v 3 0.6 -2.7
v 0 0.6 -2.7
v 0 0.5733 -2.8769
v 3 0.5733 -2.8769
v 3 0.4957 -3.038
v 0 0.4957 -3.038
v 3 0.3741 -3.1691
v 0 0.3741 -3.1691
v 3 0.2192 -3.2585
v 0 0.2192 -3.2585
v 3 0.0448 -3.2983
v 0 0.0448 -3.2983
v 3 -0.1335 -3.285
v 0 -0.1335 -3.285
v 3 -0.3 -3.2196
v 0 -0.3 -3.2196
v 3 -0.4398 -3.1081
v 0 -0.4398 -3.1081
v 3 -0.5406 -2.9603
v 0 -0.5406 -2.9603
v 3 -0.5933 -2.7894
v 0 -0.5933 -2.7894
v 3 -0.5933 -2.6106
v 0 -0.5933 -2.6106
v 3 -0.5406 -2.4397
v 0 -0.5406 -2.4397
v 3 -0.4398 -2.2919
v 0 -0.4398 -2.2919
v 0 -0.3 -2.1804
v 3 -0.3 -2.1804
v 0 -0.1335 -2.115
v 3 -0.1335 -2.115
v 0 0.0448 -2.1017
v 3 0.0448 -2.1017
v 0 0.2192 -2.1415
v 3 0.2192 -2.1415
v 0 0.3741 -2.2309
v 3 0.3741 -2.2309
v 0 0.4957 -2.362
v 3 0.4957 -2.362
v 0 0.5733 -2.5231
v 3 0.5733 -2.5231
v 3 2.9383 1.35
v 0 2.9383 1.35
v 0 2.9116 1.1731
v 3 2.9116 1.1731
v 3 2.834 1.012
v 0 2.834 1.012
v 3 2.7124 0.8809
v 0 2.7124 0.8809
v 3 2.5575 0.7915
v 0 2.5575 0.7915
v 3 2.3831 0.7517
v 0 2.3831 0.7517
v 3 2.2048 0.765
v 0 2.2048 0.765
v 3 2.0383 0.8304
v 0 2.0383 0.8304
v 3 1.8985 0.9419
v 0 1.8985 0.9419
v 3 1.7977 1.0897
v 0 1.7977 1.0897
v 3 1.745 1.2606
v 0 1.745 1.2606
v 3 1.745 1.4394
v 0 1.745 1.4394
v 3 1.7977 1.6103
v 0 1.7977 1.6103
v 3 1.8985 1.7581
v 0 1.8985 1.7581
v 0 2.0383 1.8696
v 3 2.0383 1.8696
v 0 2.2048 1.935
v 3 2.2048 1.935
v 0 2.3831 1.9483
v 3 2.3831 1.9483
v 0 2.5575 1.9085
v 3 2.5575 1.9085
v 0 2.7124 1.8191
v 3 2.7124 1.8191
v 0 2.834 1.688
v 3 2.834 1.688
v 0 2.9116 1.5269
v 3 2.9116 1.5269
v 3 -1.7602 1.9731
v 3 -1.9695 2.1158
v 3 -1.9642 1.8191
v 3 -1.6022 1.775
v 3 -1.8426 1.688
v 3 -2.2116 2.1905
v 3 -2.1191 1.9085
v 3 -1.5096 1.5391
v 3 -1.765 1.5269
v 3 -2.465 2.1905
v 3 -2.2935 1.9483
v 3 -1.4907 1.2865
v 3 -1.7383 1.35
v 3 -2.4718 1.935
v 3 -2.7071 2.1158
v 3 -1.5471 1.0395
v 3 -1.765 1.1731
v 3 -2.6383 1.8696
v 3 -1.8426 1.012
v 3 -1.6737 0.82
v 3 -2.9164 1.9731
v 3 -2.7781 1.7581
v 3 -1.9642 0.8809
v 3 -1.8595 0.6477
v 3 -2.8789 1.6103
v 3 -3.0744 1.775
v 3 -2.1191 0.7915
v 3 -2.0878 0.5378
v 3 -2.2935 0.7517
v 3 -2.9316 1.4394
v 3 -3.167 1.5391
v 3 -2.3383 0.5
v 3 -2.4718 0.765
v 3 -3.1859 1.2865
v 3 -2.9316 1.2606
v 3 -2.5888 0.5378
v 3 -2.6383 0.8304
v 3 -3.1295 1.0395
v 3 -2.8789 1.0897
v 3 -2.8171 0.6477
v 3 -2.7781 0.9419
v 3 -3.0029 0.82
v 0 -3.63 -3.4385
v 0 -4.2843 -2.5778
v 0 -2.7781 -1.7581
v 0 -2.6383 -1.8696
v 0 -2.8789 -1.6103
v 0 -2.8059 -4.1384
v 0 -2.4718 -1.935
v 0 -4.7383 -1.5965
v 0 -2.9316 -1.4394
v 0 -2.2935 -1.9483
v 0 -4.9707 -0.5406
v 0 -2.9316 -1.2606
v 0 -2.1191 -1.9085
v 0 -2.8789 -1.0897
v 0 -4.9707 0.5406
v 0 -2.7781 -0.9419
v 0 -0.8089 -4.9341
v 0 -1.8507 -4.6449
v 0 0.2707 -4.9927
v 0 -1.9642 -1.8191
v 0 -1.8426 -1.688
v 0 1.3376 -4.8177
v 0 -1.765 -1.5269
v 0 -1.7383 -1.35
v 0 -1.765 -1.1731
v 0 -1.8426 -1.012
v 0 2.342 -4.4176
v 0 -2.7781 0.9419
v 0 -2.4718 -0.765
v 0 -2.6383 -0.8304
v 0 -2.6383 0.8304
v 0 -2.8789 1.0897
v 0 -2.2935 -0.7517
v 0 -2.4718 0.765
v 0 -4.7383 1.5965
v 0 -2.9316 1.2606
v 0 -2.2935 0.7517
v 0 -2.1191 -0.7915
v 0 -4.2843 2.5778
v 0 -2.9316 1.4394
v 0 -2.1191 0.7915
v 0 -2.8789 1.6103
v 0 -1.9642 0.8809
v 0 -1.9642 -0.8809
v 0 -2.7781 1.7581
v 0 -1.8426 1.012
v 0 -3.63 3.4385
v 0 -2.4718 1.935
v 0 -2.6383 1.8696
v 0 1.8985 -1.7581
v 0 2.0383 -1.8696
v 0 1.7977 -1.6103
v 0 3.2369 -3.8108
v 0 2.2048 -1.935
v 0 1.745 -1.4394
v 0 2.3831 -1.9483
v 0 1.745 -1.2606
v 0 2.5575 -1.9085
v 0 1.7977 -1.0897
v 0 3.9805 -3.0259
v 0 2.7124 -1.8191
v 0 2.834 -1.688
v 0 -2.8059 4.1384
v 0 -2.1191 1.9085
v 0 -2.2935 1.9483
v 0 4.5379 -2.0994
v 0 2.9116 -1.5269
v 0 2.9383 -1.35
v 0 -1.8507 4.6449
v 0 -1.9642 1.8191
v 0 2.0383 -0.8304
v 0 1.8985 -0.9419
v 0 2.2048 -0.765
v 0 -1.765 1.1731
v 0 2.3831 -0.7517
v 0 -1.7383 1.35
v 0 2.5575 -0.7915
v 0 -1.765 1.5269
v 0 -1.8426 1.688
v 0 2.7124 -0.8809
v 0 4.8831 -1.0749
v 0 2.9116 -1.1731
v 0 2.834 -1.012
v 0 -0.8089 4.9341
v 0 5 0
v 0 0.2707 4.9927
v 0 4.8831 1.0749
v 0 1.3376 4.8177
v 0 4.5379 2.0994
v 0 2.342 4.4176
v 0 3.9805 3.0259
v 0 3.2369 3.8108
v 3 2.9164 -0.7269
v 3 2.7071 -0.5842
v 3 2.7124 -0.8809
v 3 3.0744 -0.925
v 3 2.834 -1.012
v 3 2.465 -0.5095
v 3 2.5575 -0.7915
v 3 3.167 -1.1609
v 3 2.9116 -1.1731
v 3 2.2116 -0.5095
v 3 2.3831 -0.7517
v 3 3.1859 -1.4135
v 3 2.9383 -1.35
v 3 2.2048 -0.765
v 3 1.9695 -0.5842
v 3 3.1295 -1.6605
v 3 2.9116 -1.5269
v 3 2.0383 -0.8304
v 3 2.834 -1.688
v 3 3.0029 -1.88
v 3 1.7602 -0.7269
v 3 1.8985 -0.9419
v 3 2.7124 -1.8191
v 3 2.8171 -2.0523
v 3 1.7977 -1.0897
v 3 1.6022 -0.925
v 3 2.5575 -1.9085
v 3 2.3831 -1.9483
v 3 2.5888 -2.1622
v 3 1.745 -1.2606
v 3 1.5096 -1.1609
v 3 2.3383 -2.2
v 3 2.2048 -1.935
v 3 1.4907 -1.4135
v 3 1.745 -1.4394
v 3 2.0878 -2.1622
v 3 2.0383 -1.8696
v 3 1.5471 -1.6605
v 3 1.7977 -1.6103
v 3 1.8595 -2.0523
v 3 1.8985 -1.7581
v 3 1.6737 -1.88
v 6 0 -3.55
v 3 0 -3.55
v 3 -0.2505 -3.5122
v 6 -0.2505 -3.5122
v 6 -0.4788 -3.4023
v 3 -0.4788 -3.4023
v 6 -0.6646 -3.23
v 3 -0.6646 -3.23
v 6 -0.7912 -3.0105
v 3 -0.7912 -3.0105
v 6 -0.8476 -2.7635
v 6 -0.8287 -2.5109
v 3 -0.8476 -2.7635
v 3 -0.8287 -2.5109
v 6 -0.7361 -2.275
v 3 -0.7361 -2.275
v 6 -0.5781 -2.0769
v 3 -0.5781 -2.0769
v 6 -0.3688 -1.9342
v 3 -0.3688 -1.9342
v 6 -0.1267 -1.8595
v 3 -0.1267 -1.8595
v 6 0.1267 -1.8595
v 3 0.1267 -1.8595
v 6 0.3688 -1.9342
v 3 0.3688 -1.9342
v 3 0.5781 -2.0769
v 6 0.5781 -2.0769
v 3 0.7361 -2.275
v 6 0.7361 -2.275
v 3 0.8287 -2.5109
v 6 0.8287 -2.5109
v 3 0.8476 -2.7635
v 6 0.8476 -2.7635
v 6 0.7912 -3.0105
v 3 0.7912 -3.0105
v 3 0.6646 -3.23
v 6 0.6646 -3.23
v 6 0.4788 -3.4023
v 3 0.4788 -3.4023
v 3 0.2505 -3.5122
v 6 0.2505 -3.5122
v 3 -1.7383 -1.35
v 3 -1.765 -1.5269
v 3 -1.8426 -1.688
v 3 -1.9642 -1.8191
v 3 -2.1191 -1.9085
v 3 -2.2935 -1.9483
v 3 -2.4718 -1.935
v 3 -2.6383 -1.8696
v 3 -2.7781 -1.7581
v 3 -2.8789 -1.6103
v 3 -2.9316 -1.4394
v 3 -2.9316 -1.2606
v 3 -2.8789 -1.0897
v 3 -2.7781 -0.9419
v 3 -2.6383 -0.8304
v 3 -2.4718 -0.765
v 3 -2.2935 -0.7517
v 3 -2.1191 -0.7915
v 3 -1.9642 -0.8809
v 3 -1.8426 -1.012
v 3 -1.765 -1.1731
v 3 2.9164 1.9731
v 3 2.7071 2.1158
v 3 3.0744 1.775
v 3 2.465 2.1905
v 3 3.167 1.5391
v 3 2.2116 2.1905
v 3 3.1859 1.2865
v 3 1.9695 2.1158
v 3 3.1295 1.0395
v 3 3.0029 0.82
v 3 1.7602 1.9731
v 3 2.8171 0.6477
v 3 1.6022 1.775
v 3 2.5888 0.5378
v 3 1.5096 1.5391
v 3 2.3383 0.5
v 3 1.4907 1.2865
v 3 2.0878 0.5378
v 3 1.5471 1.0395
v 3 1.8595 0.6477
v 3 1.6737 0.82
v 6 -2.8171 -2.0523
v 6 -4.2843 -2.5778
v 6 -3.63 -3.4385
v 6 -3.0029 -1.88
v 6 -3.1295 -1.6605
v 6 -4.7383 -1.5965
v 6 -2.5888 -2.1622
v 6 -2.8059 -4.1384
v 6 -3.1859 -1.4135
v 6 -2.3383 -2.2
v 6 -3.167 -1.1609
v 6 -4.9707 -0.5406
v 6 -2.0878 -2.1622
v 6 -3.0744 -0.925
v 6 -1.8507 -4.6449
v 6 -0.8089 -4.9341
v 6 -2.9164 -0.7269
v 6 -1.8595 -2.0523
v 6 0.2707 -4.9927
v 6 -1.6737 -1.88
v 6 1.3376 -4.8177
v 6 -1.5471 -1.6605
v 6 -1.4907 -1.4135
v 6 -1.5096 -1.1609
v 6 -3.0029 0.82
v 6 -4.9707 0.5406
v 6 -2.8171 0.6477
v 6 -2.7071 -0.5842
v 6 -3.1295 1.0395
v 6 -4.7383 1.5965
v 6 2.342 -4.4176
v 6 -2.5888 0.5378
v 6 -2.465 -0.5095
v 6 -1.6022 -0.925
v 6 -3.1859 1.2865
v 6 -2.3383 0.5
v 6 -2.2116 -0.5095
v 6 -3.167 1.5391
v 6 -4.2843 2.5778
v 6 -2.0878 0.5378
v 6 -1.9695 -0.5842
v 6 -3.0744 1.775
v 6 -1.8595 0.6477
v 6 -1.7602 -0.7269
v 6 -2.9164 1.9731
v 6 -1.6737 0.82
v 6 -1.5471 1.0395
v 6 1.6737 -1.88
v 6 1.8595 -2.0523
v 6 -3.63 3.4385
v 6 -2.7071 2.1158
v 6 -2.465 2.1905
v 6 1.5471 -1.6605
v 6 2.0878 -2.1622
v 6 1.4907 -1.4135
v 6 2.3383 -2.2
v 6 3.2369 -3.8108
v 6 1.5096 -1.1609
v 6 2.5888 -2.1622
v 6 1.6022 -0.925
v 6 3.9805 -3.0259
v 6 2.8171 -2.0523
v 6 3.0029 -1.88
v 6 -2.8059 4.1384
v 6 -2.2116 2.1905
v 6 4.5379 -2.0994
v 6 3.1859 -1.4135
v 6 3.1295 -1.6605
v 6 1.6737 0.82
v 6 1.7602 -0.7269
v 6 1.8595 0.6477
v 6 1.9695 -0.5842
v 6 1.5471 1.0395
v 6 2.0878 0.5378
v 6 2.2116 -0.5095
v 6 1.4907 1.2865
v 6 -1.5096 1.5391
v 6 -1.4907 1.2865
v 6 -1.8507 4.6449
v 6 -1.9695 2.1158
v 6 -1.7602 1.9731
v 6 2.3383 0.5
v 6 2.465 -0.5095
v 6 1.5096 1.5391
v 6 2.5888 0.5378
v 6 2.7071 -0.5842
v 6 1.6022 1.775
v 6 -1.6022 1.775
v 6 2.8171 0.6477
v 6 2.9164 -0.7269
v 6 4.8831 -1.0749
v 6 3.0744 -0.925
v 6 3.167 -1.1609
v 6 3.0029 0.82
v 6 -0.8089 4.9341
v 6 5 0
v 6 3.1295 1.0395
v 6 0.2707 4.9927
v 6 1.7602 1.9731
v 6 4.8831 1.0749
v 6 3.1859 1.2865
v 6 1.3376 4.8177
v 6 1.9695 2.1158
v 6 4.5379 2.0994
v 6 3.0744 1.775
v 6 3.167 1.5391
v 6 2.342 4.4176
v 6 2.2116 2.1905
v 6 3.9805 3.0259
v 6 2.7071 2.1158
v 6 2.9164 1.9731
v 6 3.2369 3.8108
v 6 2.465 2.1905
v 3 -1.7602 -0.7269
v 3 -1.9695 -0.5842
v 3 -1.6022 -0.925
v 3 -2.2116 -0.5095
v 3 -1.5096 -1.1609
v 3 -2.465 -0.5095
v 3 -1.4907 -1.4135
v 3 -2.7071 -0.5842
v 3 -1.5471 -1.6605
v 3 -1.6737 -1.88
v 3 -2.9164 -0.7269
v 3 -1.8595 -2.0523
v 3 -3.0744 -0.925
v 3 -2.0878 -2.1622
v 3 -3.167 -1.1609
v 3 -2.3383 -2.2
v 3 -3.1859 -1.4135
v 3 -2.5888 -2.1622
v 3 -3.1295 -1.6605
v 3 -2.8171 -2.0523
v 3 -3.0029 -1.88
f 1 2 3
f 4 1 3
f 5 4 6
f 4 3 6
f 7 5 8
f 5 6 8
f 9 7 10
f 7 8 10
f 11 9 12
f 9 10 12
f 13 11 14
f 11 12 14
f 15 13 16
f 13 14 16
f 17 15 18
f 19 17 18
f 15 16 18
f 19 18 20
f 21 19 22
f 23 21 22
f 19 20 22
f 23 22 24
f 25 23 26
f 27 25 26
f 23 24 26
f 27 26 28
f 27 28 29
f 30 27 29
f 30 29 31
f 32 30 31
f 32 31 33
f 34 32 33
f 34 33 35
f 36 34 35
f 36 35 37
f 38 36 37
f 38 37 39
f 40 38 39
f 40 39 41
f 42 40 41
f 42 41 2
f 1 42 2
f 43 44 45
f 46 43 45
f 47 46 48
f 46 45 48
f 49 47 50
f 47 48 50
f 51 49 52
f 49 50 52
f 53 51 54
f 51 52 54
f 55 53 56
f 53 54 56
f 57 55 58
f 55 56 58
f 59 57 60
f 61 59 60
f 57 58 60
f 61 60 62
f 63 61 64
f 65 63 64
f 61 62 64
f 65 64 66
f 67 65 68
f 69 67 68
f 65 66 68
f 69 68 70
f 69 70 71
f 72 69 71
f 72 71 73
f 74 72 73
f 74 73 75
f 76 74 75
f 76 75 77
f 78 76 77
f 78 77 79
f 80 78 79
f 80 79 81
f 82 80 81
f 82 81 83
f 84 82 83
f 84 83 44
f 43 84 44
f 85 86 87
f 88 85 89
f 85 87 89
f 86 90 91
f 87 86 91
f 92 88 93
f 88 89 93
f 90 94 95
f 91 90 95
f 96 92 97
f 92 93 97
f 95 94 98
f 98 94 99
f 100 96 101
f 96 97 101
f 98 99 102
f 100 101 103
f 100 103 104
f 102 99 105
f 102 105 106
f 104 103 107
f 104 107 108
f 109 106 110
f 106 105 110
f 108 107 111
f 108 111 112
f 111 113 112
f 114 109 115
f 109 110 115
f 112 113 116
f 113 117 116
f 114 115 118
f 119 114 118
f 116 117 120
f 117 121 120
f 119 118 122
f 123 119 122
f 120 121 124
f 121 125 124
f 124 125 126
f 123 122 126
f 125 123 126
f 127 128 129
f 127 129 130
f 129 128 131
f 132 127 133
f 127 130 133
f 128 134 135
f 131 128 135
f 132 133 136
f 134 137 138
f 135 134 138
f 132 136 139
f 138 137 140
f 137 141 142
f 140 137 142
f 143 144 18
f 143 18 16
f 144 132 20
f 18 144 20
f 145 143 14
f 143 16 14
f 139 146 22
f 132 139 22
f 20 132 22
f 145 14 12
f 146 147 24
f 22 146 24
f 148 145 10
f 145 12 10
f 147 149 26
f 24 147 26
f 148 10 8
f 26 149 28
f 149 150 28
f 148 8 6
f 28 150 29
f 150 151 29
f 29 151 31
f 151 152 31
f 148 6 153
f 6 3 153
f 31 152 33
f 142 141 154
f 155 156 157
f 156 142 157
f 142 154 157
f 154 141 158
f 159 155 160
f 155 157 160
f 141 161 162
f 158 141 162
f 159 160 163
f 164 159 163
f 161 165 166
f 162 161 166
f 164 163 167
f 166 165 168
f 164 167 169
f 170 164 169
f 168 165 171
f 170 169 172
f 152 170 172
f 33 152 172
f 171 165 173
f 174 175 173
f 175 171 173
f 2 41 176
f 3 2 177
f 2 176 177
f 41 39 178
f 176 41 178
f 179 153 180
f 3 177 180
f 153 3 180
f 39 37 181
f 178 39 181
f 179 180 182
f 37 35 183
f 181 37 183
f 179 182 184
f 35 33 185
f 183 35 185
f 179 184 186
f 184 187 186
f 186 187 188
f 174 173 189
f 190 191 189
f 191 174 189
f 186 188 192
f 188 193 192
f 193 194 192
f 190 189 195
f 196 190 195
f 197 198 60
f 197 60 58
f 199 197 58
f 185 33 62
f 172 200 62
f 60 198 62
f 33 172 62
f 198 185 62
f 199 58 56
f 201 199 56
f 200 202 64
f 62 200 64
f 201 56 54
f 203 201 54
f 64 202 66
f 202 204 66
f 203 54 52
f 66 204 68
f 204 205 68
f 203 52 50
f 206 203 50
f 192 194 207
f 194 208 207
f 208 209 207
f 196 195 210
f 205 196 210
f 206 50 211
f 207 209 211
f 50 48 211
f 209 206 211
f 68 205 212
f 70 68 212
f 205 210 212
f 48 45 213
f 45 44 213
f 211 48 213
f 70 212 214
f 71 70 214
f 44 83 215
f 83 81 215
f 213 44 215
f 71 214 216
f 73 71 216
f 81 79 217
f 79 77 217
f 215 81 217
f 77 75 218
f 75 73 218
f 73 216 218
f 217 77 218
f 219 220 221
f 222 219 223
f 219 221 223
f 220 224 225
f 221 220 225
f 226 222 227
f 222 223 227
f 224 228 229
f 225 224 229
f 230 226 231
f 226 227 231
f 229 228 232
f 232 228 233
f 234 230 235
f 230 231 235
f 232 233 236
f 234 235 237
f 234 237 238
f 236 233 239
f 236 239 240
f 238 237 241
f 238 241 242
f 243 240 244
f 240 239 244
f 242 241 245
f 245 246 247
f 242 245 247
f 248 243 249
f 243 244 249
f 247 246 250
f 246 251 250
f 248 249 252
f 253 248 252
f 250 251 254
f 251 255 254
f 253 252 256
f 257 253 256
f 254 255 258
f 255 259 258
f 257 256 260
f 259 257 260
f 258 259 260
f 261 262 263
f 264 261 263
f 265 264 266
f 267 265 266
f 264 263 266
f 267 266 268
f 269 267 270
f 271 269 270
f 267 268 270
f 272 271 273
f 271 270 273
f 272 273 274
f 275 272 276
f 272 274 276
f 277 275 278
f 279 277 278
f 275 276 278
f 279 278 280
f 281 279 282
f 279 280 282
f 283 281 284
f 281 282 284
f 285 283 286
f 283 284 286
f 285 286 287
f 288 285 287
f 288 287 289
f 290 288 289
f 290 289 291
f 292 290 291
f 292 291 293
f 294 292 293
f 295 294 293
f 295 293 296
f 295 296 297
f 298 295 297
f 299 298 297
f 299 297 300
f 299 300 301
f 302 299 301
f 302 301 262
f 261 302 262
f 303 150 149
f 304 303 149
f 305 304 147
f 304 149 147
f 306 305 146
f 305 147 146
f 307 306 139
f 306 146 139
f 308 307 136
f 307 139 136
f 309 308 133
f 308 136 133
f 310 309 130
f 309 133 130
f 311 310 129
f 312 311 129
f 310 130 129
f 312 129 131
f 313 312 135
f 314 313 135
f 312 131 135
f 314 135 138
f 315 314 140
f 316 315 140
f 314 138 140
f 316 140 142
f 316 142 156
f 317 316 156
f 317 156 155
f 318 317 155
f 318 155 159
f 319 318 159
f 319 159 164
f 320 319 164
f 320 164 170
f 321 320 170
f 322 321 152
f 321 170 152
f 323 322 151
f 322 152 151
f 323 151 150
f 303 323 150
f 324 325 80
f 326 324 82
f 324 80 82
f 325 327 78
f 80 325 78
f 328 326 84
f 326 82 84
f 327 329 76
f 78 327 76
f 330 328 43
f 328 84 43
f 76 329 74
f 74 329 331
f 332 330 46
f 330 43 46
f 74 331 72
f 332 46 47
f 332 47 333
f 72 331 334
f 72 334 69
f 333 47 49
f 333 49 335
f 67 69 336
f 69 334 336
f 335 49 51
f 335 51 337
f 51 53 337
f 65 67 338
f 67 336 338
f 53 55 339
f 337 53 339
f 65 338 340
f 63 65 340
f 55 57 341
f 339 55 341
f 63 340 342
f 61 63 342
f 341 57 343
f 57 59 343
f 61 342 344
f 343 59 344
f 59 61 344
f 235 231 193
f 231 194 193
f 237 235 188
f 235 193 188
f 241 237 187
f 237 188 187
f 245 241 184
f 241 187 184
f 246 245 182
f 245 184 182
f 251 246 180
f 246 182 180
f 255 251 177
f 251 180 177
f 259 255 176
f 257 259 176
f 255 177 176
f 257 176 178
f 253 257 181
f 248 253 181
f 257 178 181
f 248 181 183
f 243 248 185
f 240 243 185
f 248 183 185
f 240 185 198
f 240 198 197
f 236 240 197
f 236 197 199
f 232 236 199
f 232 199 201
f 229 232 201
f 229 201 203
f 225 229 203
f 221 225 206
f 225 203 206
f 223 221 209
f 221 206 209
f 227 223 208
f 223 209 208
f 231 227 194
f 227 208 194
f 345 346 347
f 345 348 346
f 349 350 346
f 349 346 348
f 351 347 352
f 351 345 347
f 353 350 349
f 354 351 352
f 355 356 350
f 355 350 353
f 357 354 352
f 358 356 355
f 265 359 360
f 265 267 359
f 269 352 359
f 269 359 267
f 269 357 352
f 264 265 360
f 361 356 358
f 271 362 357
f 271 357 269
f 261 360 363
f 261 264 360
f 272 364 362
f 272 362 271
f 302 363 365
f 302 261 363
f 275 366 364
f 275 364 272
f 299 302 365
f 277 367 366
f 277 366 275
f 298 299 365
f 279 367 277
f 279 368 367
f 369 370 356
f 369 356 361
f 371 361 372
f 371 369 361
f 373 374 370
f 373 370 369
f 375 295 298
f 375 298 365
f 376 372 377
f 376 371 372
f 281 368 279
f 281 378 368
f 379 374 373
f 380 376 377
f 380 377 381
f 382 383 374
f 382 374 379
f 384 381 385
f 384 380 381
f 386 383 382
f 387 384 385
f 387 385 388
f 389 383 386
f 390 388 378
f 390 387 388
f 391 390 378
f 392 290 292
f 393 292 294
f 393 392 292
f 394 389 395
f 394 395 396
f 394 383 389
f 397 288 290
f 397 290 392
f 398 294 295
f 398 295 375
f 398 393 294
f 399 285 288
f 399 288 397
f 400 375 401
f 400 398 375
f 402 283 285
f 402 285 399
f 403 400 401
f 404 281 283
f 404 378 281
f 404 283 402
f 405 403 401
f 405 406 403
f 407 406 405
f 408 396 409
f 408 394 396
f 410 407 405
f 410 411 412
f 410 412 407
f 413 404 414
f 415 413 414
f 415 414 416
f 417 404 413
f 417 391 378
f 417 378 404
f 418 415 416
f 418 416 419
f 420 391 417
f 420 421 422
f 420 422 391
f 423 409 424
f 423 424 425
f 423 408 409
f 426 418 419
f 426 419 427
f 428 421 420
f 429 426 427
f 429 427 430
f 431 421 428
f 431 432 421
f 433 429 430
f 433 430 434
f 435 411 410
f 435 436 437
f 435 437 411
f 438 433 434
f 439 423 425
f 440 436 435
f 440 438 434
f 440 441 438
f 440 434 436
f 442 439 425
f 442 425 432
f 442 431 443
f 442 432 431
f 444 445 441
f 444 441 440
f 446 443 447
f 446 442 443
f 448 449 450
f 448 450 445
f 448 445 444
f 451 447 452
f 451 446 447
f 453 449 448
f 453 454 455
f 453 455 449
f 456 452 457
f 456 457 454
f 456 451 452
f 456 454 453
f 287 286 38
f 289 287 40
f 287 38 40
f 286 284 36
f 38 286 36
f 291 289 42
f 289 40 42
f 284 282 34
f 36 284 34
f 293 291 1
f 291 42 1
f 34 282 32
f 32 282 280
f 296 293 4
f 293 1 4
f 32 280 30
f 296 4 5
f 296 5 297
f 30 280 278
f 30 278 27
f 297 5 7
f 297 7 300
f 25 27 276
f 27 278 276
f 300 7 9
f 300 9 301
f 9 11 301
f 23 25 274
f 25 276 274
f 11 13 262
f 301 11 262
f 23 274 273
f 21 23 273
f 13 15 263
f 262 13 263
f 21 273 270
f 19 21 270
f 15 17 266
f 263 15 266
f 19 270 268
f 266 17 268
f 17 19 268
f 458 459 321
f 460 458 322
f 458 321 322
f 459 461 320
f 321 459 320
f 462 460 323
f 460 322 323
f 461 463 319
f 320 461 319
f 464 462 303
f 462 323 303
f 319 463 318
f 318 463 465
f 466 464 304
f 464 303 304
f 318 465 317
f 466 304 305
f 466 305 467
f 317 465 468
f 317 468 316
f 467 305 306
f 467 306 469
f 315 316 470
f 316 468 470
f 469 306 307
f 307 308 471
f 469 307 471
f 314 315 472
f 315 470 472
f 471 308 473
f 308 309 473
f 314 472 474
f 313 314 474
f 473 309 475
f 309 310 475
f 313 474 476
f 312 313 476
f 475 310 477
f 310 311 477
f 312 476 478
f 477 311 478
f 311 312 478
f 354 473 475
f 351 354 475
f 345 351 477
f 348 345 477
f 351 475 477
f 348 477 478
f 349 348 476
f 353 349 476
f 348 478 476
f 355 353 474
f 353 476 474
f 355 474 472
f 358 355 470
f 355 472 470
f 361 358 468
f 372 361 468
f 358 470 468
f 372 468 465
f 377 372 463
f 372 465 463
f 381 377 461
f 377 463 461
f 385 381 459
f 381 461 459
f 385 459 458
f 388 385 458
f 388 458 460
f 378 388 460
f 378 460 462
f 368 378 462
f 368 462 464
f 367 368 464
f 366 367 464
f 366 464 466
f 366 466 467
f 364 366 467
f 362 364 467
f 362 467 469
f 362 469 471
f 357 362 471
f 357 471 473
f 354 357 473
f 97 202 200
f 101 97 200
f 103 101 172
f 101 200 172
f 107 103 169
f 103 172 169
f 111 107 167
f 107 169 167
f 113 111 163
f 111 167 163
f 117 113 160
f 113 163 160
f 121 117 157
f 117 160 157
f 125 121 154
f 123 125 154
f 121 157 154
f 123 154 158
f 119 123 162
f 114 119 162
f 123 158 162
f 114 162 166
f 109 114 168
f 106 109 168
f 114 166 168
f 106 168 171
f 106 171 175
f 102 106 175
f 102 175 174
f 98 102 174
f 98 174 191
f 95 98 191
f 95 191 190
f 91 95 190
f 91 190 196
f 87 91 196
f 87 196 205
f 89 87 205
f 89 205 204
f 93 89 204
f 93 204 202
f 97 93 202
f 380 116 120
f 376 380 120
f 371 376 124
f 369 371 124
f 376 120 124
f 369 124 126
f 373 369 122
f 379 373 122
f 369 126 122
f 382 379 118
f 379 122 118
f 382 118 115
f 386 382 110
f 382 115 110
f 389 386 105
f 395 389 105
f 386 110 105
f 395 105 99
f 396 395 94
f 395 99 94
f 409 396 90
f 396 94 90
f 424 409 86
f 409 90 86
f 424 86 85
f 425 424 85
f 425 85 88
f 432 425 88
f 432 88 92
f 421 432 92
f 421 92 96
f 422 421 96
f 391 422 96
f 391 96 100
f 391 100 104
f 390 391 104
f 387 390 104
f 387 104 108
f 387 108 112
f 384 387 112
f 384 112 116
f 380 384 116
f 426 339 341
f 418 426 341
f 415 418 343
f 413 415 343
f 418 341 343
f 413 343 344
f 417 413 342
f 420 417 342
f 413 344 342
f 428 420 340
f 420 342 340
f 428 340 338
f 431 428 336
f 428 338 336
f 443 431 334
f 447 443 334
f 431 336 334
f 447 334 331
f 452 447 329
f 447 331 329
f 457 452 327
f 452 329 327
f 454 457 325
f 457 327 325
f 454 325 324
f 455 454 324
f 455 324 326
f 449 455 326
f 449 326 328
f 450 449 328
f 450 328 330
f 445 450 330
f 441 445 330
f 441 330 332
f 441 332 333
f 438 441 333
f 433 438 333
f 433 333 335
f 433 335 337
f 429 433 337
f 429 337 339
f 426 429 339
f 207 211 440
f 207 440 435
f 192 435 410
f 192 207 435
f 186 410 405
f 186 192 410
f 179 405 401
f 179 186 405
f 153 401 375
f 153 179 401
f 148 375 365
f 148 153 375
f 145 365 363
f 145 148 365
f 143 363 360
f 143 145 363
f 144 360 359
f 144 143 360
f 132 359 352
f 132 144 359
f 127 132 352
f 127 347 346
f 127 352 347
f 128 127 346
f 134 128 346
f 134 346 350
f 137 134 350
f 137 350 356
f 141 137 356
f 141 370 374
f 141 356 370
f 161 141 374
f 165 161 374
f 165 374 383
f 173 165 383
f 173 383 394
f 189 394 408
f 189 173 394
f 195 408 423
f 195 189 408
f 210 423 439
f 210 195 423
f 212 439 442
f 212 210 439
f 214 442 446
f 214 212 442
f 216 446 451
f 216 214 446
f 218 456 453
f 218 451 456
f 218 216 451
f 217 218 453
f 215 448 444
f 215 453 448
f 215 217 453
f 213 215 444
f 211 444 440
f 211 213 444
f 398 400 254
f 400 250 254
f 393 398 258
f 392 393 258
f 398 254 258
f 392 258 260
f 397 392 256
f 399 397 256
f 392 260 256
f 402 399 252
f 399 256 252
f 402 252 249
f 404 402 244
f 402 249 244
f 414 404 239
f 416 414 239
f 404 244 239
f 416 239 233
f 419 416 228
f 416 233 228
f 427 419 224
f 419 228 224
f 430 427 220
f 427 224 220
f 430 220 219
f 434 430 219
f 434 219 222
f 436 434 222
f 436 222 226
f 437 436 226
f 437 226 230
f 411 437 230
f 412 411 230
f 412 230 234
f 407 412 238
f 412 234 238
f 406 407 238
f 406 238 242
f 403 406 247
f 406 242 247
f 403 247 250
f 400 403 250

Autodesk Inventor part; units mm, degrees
ref_plane "YZ Plane" through (0, 0, 0) normal (1, 0, 0) x (0, 1, 0)
ref_plane "XZ Plane" through (0, 0, 0) normal (0, 1, 0) x (-1, 0, 0)
ref_plane "XY Plane" through (0, 0, 0) normal (0, 0, 1) x (1, 0, 0)
sketch "Эскиз1" plane through (0, 0, 0) normal (1, 0, 0) x (0, 1, 0)
  circle A0 centre (0, 0) radius 5
  circle A1 centre (0, -2.7) radius 0.6
  circle A2 centre (0, 0) radius 2.7 construction
  circle A3 centre (-2.3383, 1.35) radius 0.6
  circle A4 centre (2.3383, 1.35) radius 0.6
  line L0 (0, 0) -> (5.0108, 2.893) construction
  line L1 (0, 0) -> (-4.6178, 2.6661) construction
  line L2 (0, 0) -> (6.4667, 0) construction
  line L3 (0, 0) -> (-4.6765, -2.7) construction
  line L4 (0, 0) -> (4.6765, -2.7) construction
  circle A5 centre (-2.3383, -1.35) radius 0.6
  circle A6 centre (2.3383, -1.35) radius 0.6
  dimension "d1" = 10
  dimension "d3" = 1.2
  dimension "d24" = 5.4
  dimension "d25" = 1.2
  dimension "d26" = 1.2
  dimension "d53" = 120
  dimension "d54" = 30
  dimension "d55" = 120
  dimension "d56" = 30
  dimension "d57" = 1.2
  dimension "d58" = 1.2
extrude "Выдавливание1" add sketch "Эскиз1" along normal blind 6 contours A0 | A3 | A4 | A5 | A6
sketch "Эскиз6" plane through (6, 0, 0) normal (1, 0, 0) x (0, 0, -1)
  circle A0 centre (2.7, 0) radius 0.6 projected
hole "Отверстие2" at (6, 0, -2.7) direction (-1, 0, 0) diameter 1.7 depth 3
extrude "Выдавливание2" cut sketch "Эскиз1" along normal blind 6 contours A3 | A4
sketch "Эскиз2" plane through (6, 0, 0) normal (1, 0, 0) x (0, 0, -1)
  point P0 (0, 0)
  point P1 (-1.35, 2.3383)
hole "Отверстие4" at (6, 2.3383, 1.35) direction (-1, 0, 0) diameter 1.7 depth 3
sketch "Эскиз3" plane through (6, 0, 0) normal (1, 0, 0) x (0, 0, -1)
  point P0 (0, 0)
  point P1 (-1.35, -2.3383)
hole "Отверстие5" at (6, -2.3383, 1.35) direction (-1, 0, 0) diameter 1.7 depth 3
extrude "Выдавливание3" cut sketch "Эскиз1" along normal blind 6 contours A5 | A6
sketch "Эскиз4" plane through (6, 0, 0) normal (1, 0, 0) x (0, 0, -1)
  point P0 (0, 0)
  point P1 (1.35, 2.3383)
hole "Отверстие6" at (6, 2.3383, -1.35) direction (-1, 0, 0) diameter 1.7 depth 3
sketch "Эскиз5" plane through (6, 0, 0) normal (1, 0, 0) x (0, 0, -1)
  point P0 (0, 0)
  point P1 (1.35, -2.3383)
hole "Отверстие7" at (6, -2.3383, -1.35) direction (-1, 0, 0) diameter 1.7 depth 3
equation "\"d1\" = inside"
equation "\"d3\" = 2 * pin_small_rad"
equation "\"d17\" = pin_big_dia"
equation "\"inside\" = 10"
equation "\"pin_small_rad\" = 0.6"
equation "\"pin_big_dia\" = 1.7"
properties part number "каркас" material "Пластмасса, непрозрачная, черная"
